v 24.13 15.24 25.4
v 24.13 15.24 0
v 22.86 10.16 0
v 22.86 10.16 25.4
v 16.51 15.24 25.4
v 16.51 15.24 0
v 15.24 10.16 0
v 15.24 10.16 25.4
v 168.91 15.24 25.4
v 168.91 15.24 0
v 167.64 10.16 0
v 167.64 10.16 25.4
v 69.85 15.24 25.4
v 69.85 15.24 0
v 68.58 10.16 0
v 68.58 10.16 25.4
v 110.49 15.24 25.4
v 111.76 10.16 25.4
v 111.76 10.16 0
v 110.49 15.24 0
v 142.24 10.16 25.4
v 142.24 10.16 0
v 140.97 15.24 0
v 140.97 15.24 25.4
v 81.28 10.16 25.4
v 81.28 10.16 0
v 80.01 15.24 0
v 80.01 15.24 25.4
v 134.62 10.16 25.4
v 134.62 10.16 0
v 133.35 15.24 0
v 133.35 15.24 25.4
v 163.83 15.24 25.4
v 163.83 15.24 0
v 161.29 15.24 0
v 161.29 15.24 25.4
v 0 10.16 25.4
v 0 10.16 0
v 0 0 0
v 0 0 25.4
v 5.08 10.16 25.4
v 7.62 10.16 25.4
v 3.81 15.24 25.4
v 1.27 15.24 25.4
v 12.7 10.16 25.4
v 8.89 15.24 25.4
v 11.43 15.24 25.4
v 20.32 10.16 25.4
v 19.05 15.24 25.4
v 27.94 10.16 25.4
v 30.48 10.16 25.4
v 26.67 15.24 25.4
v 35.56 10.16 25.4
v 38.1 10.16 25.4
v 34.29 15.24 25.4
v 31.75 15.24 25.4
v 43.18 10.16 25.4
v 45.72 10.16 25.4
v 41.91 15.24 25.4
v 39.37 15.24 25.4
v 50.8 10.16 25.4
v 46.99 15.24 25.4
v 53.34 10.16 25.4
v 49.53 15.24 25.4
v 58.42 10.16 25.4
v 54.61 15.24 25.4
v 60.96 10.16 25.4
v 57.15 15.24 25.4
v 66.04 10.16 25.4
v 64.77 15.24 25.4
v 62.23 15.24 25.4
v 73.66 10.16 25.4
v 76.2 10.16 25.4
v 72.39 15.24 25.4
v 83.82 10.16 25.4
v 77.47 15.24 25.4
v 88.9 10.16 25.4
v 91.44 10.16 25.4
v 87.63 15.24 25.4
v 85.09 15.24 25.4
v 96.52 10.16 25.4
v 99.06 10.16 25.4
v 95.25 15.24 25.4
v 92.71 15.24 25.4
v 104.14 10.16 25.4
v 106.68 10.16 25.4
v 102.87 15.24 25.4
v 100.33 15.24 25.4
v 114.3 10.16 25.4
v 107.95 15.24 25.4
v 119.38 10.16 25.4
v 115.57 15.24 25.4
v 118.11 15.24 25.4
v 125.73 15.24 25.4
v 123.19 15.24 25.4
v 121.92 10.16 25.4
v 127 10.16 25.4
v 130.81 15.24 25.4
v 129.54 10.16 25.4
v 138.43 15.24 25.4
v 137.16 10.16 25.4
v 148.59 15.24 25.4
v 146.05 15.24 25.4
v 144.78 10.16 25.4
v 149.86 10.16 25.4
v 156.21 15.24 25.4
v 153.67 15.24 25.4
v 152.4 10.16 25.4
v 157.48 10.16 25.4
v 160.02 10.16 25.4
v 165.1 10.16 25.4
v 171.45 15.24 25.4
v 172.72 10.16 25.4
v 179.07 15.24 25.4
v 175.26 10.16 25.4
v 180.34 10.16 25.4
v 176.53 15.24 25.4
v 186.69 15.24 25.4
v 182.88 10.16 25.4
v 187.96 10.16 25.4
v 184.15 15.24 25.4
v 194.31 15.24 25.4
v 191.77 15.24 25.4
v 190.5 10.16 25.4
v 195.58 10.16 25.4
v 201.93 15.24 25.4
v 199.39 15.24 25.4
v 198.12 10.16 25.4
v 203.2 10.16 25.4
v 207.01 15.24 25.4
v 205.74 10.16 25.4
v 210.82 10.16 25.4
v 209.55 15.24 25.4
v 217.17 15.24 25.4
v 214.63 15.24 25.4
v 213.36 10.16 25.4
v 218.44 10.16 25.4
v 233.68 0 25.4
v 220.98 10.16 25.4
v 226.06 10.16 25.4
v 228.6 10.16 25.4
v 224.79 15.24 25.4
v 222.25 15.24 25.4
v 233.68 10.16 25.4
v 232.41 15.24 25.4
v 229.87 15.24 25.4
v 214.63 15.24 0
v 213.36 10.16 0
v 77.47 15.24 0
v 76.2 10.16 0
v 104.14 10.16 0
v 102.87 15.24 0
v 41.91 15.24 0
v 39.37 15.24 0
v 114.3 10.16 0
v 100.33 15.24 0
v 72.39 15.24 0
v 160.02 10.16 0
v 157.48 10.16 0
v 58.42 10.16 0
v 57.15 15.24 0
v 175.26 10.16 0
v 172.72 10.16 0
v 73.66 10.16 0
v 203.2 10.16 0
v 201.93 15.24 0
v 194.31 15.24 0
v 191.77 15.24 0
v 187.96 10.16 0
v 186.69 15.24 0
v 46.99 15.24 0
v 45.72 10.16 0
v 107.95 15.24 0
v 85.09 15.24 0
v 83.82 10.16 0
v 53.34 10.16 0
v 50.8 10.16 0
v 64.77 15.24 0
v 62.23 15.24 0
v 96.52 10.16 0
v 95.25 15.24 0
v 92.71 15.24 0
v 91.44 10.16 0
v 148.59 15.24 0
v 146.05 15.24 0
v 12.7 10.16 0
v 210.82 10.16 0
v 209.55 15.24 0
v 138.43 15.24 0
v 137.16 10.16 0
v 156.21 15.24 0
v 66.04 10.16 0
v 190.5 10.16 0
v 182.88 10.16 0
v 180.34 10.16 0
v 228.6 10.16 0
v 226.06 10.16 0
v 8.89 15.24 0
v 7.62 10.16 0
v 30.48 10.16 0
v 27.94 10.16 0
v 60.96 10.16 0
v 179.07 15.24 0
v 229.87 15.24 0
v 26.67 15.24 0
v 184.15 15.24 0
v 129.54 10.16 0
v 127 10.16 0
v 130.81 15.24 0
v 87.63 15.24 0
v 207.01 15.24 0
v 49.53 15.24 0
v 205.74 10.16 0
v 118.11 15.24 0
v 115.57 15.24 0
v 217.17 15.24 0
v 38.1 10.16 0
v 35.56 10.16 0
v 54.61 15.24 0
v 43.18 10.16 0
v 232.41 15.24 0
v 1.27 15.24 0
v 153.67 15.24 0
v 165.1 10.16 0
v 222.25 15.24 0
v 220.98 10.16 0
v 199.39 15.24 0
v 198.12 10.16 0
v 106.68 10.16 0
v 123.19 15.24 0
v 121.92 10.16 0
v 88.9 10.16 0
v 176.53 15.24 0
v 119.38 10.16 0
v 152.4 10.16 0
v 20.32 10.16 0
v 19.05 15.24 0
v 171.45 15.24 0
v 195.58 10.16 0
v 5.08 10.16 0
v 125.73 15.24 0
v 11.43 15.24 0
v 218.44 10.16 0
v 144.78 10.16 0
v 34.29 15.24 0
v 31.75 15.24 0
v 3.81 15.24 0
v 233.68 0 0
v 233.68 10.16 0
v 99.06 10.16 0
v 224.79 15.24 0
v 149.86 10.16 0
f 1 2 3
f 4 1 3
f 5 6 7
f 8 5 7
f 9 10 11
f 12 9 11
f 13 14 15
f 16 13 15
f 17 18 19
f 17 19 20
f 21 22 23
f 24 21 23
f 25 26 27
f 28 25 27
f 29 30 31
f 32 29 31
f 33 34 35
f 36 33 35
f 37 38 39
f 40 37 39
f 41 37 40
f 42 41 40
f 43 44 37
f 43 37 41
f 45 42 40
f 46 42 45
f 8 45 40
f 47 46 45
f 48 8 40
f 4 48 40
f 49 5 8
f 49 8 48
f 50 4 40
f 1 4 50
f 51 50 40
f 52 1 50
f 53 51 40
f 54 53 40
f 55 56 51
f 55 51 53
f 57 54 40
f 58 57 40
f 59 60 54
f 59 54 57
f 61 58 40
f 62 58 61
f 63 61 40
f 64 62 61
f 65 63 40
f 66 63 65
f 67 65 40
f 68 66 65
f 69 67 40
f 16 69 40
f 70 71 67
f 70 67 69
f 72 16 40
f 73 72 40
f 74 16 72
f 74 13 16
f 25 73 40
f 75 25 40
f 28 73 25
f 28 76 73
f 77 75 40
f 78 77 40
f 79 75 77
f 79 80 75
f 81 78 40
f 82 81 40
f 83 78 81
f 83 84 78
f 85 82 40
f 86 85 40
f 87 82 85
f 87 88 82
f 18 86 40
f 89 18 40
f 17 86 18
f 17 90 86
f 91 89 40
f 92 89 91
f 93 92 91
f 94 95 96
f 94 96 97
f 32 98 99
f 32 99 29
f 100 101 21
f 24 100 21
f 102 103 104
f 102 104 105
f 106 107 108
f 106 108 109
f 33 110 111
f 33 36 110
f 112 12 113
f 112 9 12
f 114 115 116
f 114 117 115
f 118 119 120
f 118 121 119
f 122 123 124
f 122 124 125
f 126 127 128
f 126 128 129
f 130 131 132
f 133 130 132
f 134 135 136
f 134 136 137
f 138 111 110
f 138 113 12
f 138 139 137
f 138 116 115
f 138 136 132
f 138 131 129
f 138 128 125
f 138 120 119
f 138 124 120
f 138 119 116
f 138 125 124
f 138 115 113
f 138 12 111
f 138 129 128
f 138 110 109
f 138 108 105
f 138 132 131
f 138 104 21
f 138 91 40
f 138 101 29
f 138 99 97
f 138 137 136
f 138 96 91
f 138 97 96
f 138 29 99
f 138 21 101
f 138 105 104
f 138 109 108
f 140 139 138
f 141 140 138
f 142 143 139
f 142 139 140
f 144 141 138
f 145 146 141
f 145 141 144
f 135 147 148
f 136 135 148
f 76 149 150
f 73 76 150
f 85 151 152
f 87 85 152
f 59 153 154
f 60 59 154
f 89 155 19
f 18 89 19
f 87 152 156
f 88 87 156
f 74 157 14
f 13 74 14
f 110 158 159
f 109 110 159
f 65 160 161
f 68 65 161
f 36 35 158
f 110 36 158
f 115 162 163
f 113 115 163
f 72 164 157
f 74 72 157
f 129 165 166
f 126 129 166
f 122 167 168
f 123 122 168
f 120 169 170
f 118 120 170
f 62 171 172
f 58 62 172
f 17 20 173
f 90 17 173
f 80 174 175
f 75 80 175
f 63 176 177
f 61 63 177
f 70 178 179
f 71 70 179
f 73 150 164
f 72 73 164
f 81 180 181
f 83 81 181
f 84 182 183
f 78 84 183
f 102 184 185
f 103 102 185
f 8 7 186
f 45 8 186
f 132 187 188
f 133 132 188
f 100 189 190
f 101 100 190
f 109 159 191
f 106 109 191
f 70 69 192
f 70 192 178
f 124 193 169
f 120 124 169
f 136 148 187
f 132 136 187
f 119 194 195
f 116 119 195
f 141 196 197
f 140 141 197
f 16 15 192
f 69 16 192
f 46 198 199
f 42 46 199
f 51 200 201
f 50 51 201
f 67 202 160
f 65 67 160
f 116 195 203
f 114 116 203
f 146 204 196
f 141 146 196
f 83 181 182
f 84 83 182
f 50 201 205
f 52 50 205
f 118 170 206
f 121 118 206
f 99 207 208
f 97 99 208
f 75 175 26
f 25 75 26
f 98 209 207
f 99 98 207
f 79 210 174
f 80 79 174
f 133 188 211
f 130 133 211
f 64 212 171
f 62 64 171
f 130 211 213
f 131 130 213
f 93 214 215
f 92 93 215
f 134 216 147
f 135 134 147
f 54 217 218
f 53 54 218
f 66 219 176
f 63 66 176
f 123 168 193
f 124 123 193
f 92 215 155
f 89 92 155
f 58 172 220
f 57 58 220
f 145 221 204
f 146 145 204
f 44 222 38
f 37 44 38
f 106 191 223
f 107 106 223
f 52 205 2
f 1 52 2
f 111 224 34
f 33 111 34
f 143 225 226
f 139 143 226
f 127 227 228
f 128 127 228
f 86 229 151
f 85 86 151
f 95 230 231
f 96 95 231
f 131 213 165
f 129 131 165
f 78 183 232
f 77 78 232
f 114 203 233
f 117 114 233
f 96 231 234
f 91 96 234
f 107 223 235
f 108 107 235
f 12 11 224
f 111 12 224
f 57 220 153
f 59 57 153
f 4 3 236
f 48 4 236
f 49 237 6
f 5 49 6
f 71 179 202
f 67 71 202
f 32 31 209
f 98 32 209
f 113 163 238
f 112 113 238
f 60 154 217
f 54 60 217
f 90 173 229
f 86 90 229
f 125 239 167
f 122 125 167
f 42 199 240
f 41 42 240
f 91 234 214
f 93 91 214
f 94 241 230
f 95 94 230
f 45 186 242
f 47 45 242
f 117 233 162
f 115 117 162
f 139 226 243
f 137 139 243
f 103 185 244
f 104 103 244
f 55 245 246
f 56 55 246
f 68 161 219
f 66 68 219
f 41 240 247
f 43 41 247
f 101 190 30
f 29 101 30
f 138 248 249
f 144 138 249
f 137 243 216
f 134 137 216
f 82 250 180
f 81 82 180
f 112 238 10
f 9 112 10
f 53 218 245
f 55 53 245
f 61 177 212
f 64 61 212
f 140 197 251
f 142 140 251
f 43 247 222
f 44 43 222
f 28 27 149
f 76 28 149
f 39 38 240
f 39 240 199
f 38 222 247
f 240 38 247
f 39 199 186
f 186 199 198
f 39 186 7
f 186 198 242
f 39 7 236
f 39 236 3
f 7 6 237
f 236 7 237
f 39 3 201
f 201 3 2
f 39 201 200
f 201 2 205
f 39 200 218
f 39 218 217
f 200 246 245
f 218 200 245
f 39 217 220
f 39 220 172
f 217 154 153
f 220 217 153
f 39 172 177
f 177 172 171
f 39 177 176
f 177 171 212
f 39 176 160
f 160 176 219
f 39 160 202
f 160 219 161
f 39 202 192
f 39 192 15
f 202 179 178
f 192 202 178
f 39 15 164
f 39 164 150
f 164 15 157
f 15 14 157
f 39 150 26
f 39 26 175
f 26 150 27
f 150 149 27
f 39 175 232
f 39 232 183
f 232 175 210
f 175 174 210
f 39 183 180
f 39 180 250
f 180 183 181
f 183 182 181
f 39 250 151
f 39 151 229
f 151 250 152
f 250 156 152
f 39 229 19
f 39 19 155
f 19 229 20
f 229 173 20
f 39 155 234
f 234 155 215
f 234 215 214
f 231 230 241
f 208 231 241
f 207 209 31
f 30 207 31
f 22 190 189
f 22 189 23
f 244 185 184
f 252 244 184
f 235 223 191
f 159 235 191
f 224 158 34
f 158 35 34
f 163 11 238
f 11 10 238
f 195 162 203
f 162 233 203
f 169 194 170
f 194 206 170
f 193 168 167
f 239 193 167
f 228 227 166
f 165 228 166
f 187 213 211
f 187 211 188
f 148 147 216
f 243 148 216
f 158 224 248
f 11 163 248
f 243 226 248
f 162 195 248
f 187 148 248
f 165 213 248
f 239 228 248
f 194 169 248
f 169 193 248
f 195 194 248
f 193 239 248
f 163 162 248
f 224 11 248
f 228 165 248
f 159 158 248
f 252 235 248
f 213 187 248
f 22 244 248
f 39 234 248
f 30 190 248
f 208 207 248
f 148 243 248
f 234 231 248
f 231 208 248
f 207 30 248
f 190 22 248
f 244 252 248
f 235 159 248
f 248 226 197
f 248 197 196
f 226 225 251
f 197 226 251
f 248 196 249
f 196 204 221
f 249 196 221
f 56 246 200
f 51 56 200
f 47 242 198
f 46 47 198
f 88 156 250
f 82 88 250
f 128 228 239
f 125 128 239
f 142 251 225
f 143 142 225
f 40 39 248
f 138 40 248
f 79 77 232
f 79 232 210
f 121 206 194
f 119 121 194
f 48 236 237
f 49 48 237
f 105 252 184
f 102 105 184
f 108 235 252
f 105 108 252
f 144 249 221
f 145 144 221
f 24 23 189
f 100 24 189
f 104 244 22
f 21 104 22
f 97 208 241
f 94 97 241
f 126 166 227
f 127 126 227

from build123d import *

# Parameters (mm, degrees)
BOSS_EXTRUDE1_DEPTH = 25.4


with BuildPart() as part:
    # Sketch1 → Boss-Extrude1 (new body)
    with BuildSketch(Plane.XY):
        Polygon((0, 0), (233.68, 0), (233.68, 10.16), (232.41, 15.24), (229.87, 15.24), (228.6, 10.16), (226.06, 10.16), (224.79, 15.24), (222.25, 15.24), (220.98, 10.16), (218.44, 10.16), (217.17, 15.24), (214.63, 15.24), (213.36, 10.16), (210.82, 10.16), (209.55, 15.24), (207.01, 15.24), (205.74, 10.16), (203.2, 10.16), (201.93, 15.24), (199.39, 15.24), (198.12, 10.16), (195.58, 10.16), (194.31, 15.24), (191.77, 15.24), (190.5, 10.16), (187.96, 10.16), (186.69, 15.24), (184.15, 15.24), (182.88, 10.16), (180.34, 10.16), (179.07, 15.24), (176.53, 15.24), (175.26, 10.16), (172.72, 10.16), (171.45, 15.24), (168.91, 15.24), (167.64, 10.16), (165.1, 10.16), (163.83, 15.24), (161.29, 15.24), (160.02, 10.16), (157.48, 10.16), (156.21, 15.24), (153.67, 15.24), (152.4, 10.16), (149.86, 10.16), (148.59, 15.24), (146.05, 15.24), (144.78, 10.16), (142.24, 10.16), (140.97, 15.24), (138.43, 15.24), (137.16, 10.16), (134.62, 10.16), (133.35, 15.24), (130.81, 15.24), (129.54, 10.16), (127, 10.16), (125.73, 15.24), (123.19, 15.24), (121.92, 10.16), (119.38, 10.16), (118.11, 15.24), (115.57, 15.24), (114.3, 10.16), (111.76, 10.16), (110.49, 15.24), (107.95, 15.24), (106.68, 10.16), (104.14, 10.16), (102.87, 15.24), (100.33, 15.24), (99.06, 10.16), (96.52, 10.16), (95.25, 15.24), (92.71, 15.24), (91.44, 10.16), (88.9, 10.16), (87.63, 15.24), (85.09, 15.24), (83.82, 10.16), (81.28, 10.16), (80.01, 15.24), (77.47, 15.24), (76.2, 10.16), (73.66, 10.16), (72.39, 15.24), (69.85, 15.24), (68.58, 10.16), (66.04, 10.16), (64.77, 15.24), (62.23, 15.24), (60.96, 10.16), (58.42, 10.16), (57.15, 15.24), (54.61, 15.24), (53.34, 10.16), (50.8, 10.16), (49.53, 15.24), (46.99, 15.24), (45.72, 10.16), (43.18, 10.16), (41.91, 15.24), (39.37, 15.24), (38.1, 10.16), (35.56, 10.16), (34.29, 15.24), (31.75, 15.24), (30.48, 10.16), (27.94, 10.16), (26.67, 15.24), (24.13, 15.24), (22.86, 10.16), (20.32, 10.16), (19.05, 15.24), (16.51, 15.24), (15.24, 10.16), (12.7, 10.16), (11.43, 15.24), (8.89, 15.24), (7.62, 10.16), (5.08, 10.16), (3.81, 15.24), (1.27, 15.24), (0, 10.16), align=None)
    extrude(amount=BOSS_EXTRUDE1_DEPTH)


solid = part.part
